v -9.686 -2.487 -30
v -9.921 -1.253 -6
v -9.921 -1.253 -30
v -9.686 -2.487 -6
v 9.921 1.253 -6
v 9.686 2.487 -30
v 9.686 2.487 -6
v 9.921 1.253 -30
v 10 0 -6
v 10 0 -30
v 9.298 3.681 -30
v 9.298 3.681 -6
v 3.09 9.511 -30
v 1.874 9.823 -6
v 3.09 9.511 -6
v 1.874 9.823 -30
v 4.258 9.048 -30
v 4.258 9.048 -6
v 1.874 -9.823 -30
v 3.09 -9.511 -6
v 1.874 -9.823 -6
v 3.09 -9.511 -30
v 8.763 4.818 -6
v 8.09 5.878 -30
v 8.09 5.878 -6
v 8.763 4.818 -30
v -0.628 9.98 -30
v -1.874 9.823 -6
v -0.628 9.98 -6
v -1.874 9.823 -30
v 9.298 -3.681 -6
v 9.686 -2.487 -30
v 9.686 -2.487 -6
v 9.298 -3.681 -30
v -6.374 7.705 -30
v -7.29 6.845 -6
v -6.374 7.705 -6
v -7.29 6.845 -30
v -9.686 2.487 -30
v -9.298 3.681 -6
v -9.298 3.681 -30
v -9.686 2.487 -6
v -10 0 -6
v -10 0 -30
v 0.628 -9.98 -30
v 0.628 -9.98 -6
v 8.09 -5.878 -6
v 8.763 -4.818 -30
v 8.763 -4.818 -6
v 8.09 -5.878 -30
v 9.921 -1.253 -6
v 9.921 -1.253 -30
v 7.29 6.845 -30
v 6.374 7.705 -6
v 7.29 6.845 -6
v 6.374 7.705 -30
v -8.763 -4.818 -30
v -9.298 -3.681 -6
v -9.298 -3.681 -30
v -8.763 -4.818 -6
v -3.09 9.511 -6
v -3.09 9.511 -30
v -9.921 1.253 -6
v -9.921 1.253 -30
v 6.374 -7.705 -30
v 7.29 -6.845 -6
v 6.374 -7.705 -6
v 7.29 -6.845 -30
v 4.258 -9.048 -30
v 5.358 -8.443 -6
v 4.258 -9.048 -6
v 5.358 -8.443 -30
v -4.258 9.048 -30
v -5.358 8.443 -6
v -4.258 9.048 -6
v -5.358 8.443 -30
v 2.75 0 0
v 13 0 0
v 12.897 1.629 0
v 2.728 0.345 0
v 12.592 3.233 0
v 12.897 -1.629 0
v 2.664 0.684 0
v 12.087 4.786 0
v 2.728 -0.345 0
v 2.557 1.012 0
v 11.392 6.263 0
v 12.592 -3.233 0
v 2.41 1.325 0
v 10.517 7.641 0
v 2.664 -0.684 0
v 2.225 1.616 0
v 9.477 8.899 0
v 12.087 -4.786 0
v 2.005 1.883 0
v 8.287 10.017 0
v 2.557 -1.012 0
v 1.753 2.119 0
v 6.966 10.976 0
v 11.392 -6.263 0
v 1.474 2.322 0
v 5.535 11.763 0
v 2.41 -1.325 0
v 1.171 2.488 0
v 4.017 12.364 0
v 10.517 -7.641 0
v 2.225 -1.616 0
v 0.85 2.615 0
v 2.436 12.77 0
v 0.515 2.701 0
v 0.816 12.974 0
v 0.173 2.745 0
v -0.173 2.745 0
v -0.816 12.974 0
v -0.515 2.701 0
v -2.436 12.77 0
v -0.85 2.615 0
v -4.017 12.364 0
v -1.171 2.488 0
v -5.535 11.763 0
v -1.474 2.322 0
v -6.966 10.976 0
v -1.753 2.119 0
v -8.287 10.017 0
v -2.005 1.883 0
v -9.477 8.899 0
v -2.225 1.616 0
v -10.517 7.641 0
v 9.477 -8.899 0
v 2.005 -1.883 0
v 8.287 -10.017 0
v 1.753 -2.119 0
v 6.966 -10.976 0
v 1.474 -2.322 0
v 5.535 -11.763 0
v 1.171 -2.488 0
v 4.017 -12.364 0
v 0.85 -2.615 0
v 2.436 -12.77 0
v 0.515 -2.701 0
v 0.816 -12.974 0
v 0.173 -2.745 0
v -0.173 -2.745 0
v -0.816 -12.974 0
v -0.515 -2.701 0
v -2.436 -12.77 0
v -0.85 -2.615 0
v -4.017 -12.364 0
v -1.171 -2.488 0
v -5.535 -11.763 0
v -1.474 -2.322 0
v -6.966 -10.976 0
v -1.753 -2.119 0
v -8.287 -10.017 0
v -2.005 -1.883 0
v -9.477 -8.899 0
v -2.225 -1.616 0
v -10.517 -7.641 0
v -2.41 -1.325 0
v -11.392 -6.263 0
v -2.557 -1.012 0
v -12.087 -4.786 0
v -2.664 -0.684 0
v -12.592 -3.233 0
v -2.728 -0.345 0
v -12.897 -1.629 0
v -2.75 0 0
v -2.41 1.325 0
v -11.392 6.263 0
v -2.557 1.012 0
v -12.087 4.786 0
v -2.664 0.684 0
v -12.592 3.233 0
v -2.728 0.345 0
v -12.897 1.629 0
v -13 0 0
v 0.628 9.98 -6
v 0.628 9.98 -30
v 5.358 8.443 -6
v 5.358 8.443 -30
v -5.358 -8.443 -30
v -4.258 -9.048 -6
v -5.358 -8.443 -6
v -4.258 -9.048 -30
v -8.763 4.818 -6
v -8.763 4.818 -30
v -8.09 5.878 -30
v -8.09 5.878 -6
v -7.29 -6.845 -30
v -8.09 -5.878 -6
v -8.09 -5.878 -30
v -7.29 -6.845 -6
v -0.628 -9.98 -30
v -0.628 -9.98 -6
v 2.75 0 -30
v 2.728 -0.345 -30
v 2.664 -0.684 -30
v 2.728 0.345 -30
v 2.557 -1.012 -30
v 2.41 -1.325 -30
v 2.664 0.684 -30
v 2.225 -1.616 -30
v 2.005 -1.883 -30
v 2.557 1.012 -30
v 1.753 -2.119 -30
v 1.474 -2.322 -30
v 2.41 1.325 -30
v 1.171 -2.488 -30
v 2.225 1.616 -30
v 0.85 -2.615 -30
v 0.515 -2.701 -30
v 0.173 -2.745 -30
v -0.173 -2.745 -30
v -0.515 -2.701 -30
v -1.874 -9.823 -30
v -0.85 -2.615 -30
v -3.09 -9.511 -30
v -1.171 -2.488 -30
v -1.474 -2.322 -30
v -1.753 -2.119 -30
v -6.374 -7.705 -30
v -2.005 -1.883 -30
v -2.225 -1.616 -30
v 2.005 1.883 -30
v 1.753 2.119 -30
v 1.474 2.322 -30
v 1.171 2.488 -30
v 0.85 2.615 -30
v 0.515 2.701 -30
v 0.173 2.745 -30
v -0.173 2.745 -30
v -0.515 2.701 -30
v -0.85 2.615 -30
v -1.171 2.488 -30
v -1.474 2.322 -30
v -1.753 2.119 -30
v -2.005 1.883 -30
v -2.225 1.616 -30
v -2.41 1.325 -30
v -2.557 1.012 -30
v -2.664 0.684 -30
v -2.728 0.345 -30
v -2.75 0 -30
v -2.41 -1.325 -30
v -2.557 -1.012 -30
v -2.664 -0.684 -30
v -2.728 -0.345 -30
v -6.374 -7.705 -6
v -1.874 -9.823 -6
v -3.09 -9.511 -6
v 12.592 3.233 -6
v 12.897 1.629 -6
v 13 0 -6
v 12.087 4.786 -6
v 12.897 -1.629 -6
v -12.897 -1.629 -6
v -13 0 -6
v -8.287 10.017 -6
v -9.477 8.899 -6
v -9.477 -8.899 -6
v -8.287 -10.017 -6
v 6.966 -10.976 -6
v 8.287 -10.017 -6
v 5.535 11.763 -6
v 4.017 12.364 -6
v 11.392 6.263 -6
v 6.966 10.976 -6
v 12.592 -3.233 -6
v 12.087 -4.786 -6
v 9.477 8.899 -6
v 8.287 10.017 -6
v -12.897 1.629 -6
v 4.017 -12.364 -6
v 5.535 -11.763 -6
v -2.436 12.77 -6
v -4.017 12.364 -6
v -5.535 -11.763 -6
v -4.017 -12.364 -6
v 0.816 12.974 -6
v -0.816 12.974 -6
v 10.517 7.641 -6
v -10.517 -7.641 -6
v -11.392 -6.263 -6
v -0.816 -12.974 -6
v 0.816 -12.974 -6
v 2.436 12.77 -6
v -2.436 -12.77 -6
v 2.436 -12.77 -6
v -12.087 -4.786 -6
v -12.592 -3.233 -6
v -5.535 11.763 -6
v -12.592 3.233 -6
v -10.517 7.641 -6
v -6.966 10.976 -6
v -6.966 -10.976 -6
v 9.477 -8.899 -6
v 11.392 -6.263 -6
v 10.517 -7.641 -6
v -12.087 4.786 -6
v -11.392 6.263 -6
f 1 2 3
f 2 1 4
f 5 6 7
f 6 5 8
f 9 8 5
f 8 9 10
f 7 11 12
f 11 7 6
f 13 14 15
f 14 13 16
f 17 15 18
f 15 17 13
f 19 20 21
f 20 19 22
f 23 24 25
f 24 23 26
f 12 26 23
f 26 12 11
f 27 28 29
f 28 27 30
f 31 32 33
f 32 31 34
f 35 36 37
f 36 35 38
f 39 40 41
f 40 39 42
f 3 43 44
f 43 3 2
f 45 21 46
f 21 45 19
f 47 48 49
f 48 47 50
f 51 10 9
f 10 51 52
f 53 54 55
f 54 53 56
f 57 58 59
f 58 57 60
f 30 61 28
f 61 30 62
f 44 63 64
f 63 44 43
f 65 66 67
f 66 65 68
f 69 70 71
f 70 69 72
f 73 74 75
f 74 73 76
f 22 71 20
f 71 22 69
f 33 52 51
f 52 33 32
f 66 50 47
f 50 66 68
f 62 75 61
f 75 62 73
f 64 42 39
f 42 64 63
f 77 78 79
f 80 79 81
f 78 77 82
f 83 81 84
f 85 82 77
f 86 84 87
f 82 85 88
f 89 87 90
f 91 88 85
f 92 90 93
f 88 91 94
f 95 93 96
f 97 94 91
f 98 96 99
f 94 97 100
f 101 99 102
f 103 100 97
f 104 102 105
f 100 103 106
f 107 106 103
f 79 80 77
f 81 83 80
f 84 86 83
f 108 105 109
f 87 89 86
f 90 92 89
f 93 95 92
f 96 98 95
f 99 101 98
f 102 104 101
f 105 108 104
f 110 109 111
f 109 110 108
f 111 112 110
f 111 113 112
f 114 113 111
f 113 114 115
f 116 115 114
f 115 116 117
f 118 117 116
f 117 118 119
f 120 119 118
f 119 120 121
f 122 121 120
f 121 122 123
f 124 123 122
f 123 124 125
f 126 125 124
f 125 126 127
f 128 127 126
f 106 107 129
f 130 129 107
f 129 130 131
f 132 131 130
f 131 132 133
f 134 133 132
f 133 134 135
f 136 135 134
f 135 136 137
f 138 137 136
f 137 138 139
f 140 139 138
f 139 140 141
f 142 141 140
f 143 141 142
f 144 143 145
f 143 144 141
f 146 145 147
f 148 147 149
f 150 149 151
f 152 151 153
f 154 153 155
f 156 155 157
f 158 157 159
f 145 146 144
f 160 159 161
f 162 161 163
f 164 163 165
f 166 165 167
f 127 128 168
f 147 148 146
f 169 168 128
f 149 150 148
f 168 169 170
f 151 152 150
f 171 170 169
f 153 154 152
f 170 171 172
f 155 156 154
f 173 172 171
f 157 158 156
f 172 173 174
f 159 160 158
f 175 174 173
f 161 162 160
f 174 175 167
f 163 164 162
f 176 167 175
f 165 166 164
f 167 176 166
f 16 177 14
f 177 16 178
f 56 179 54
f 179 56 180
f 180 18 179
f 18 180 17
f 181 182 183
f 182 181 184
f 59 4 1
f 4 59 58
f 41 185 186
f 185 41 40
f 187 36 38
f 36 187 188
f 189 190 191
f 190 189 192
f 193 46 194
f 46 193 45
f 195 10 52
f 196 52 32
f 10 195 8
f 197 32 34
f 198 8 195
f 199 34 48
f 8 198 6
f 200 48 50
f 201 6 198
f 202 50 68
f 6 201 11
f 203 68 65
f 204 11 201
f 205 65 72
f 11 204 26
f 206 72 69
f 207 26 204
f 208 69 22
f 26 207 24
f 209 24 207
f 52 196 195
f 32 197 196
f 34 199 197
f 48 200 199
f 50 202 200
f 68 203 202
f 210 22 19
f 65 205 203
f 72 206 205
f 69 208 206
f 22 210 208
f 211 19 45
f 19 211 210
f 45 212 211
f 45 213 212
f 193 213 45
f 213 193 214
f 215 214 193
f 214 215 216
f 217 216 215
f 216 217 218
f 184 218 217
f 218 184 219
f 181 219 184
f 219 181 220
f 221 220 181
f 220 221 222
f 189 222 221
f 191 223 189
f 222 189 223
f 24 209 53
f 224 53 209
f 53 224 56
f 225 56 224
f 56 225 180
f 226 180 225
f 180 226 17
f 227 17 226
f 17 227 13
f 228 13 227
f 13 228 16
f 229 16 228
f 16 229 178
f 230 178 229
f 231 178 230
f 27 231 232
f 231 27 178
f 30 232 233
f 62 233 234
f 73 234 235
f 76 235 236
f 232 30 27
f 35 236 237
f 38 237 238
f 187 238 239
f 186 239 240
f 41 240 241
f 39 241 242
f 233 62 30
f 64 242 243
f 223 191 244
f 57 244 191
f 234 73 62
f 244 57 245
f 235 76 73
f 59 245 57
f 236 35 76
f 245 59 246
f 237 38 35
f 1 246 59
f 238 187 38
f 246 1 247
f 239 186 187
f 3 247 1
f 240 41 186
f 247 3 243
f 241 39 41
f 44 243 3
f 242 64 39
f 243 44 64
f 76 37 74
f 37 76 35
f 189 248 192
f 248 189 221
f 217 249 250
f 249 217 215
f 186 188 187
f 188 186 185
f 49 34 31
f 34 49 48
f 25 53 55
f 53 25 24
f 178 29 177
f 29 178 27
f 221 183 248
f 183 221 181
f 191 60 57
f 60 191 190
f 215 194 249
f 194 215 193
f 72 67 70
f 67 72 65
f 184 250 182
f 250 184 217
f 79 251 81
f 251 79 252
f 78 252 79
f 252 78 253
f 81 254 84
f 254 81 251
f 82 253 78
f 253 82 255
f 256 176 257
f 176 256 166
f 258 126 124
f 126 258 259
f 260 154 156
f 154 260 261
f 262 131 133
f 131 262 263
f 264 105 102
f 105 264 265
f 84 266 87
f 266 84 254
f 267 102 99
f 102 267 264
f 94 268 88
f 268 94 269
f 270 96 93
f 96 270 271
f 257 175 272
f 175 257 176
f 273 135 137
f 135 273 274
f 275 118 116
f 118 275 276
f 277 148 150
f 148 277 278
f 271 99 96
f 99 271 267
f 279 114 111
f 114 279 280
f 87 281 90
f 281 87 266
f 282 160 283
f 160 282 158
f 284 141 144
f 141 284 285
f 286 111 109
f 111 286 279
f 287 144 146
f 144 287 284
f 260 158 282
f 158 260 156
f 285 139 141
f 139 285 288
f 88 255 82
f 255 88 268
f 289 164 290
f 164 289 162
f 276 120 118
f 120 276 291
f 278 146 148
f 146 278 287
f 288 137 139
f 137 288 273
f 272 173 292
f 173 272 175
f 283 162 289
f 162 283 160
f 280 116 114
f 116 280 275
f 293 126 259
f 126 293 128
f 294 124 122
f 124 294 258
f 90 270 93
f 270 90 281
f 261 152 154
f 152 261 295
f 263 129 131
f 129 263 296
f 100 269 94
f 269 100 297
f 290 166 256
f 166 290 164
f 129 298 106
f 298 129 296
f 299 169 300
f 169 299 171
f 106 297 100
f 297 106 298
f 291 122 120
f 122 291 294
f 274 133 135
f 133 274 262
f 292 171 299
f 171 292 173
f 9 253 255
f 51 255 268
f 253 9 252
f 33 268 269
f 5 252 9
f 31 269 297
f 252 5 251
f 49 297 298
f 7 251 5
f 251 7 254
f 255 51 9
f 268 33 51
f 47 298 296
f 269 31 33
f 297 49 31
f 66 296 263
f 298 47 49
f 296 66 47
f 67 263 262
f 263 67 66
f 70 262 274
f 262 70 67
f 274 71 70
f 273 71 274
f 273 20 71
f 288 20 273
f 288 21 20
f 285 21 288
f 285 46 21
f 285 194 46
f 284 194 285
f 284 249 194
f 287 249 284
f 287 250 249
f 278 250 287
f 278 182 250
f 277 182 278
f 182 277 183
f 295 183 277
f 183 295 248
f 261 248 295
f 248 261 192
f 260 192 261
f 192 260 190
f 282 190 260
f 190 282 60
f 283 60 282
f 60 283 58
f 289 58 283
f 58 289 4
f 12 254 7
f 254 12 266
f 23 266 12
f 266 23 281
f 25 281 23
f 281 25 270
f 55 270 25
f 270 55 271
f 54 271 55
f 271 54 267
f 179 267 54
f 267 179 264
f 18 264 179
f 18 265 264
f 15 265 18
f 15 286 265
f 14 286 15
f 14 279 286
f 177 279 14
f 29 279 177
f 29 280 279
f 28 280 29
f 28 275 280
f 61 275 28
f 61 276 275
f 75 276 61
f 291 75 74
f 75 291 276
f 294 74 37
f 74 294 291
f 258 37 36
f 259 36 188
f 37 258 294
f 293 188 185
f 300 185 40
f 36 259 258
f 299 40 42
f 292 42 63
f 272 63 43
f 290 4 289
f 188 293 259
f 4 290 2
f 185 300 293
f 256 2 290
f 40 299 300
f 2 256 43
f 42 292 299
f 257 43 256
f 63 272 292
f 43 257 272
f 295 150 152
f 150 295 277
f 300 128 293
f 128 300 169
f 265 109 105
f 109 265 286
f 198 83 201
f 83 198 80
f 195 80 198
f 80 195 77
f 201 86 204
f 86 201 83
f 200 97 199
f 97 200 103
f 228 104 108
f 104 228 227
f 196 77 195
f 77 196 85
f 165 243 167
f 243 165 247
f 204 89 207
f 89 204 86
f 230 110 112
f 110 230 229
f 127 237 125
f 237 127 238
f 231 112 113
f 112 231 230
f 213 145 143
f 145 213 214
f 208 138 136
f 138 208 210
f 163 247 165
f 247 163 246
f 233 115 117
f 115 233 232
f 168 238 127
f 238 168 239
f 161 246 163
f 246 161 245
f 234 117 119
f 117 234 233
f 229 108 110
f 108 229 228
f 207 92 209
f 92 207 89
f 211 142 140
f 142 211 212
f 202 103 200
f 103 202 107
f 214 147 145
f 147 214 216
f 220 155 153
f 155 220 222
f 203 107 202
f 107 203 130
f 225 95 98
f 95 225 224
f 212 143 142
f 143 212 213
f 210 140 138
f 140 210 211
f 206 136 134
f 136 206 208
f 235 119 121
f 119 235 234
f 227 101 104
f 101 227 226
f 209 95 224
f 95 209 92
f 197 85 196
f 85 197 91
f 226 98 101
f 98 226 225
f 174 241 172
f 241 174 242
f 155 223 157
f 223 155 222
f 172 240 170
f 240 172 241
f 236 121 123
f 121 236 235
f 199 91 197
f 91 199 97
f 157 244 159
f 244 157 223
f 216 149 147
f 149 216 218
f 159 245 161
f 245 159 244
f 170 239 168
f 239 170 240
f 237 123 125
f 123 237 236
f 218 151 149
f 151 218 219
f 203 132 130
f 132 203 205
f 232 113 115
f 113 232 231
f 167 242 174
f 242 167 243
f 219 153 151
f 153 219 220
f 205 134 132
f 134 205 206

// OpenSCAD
$fn = 50;


difference() {
	union() {
		translate(v = [0, 0, -30.0000000000]) {
			cylinder(h = 30, r = 10.0000000000);
		}
		translate(v = [0, 0, -6.0000000000]) {
			cylinder(h = 6, r = 13.0000000000);
		}
	}
	union() {
		#translate(v = [0, 0, -30]) {
			cylinder(h = 30, r = 2.7500000000);
		}
	}
}
